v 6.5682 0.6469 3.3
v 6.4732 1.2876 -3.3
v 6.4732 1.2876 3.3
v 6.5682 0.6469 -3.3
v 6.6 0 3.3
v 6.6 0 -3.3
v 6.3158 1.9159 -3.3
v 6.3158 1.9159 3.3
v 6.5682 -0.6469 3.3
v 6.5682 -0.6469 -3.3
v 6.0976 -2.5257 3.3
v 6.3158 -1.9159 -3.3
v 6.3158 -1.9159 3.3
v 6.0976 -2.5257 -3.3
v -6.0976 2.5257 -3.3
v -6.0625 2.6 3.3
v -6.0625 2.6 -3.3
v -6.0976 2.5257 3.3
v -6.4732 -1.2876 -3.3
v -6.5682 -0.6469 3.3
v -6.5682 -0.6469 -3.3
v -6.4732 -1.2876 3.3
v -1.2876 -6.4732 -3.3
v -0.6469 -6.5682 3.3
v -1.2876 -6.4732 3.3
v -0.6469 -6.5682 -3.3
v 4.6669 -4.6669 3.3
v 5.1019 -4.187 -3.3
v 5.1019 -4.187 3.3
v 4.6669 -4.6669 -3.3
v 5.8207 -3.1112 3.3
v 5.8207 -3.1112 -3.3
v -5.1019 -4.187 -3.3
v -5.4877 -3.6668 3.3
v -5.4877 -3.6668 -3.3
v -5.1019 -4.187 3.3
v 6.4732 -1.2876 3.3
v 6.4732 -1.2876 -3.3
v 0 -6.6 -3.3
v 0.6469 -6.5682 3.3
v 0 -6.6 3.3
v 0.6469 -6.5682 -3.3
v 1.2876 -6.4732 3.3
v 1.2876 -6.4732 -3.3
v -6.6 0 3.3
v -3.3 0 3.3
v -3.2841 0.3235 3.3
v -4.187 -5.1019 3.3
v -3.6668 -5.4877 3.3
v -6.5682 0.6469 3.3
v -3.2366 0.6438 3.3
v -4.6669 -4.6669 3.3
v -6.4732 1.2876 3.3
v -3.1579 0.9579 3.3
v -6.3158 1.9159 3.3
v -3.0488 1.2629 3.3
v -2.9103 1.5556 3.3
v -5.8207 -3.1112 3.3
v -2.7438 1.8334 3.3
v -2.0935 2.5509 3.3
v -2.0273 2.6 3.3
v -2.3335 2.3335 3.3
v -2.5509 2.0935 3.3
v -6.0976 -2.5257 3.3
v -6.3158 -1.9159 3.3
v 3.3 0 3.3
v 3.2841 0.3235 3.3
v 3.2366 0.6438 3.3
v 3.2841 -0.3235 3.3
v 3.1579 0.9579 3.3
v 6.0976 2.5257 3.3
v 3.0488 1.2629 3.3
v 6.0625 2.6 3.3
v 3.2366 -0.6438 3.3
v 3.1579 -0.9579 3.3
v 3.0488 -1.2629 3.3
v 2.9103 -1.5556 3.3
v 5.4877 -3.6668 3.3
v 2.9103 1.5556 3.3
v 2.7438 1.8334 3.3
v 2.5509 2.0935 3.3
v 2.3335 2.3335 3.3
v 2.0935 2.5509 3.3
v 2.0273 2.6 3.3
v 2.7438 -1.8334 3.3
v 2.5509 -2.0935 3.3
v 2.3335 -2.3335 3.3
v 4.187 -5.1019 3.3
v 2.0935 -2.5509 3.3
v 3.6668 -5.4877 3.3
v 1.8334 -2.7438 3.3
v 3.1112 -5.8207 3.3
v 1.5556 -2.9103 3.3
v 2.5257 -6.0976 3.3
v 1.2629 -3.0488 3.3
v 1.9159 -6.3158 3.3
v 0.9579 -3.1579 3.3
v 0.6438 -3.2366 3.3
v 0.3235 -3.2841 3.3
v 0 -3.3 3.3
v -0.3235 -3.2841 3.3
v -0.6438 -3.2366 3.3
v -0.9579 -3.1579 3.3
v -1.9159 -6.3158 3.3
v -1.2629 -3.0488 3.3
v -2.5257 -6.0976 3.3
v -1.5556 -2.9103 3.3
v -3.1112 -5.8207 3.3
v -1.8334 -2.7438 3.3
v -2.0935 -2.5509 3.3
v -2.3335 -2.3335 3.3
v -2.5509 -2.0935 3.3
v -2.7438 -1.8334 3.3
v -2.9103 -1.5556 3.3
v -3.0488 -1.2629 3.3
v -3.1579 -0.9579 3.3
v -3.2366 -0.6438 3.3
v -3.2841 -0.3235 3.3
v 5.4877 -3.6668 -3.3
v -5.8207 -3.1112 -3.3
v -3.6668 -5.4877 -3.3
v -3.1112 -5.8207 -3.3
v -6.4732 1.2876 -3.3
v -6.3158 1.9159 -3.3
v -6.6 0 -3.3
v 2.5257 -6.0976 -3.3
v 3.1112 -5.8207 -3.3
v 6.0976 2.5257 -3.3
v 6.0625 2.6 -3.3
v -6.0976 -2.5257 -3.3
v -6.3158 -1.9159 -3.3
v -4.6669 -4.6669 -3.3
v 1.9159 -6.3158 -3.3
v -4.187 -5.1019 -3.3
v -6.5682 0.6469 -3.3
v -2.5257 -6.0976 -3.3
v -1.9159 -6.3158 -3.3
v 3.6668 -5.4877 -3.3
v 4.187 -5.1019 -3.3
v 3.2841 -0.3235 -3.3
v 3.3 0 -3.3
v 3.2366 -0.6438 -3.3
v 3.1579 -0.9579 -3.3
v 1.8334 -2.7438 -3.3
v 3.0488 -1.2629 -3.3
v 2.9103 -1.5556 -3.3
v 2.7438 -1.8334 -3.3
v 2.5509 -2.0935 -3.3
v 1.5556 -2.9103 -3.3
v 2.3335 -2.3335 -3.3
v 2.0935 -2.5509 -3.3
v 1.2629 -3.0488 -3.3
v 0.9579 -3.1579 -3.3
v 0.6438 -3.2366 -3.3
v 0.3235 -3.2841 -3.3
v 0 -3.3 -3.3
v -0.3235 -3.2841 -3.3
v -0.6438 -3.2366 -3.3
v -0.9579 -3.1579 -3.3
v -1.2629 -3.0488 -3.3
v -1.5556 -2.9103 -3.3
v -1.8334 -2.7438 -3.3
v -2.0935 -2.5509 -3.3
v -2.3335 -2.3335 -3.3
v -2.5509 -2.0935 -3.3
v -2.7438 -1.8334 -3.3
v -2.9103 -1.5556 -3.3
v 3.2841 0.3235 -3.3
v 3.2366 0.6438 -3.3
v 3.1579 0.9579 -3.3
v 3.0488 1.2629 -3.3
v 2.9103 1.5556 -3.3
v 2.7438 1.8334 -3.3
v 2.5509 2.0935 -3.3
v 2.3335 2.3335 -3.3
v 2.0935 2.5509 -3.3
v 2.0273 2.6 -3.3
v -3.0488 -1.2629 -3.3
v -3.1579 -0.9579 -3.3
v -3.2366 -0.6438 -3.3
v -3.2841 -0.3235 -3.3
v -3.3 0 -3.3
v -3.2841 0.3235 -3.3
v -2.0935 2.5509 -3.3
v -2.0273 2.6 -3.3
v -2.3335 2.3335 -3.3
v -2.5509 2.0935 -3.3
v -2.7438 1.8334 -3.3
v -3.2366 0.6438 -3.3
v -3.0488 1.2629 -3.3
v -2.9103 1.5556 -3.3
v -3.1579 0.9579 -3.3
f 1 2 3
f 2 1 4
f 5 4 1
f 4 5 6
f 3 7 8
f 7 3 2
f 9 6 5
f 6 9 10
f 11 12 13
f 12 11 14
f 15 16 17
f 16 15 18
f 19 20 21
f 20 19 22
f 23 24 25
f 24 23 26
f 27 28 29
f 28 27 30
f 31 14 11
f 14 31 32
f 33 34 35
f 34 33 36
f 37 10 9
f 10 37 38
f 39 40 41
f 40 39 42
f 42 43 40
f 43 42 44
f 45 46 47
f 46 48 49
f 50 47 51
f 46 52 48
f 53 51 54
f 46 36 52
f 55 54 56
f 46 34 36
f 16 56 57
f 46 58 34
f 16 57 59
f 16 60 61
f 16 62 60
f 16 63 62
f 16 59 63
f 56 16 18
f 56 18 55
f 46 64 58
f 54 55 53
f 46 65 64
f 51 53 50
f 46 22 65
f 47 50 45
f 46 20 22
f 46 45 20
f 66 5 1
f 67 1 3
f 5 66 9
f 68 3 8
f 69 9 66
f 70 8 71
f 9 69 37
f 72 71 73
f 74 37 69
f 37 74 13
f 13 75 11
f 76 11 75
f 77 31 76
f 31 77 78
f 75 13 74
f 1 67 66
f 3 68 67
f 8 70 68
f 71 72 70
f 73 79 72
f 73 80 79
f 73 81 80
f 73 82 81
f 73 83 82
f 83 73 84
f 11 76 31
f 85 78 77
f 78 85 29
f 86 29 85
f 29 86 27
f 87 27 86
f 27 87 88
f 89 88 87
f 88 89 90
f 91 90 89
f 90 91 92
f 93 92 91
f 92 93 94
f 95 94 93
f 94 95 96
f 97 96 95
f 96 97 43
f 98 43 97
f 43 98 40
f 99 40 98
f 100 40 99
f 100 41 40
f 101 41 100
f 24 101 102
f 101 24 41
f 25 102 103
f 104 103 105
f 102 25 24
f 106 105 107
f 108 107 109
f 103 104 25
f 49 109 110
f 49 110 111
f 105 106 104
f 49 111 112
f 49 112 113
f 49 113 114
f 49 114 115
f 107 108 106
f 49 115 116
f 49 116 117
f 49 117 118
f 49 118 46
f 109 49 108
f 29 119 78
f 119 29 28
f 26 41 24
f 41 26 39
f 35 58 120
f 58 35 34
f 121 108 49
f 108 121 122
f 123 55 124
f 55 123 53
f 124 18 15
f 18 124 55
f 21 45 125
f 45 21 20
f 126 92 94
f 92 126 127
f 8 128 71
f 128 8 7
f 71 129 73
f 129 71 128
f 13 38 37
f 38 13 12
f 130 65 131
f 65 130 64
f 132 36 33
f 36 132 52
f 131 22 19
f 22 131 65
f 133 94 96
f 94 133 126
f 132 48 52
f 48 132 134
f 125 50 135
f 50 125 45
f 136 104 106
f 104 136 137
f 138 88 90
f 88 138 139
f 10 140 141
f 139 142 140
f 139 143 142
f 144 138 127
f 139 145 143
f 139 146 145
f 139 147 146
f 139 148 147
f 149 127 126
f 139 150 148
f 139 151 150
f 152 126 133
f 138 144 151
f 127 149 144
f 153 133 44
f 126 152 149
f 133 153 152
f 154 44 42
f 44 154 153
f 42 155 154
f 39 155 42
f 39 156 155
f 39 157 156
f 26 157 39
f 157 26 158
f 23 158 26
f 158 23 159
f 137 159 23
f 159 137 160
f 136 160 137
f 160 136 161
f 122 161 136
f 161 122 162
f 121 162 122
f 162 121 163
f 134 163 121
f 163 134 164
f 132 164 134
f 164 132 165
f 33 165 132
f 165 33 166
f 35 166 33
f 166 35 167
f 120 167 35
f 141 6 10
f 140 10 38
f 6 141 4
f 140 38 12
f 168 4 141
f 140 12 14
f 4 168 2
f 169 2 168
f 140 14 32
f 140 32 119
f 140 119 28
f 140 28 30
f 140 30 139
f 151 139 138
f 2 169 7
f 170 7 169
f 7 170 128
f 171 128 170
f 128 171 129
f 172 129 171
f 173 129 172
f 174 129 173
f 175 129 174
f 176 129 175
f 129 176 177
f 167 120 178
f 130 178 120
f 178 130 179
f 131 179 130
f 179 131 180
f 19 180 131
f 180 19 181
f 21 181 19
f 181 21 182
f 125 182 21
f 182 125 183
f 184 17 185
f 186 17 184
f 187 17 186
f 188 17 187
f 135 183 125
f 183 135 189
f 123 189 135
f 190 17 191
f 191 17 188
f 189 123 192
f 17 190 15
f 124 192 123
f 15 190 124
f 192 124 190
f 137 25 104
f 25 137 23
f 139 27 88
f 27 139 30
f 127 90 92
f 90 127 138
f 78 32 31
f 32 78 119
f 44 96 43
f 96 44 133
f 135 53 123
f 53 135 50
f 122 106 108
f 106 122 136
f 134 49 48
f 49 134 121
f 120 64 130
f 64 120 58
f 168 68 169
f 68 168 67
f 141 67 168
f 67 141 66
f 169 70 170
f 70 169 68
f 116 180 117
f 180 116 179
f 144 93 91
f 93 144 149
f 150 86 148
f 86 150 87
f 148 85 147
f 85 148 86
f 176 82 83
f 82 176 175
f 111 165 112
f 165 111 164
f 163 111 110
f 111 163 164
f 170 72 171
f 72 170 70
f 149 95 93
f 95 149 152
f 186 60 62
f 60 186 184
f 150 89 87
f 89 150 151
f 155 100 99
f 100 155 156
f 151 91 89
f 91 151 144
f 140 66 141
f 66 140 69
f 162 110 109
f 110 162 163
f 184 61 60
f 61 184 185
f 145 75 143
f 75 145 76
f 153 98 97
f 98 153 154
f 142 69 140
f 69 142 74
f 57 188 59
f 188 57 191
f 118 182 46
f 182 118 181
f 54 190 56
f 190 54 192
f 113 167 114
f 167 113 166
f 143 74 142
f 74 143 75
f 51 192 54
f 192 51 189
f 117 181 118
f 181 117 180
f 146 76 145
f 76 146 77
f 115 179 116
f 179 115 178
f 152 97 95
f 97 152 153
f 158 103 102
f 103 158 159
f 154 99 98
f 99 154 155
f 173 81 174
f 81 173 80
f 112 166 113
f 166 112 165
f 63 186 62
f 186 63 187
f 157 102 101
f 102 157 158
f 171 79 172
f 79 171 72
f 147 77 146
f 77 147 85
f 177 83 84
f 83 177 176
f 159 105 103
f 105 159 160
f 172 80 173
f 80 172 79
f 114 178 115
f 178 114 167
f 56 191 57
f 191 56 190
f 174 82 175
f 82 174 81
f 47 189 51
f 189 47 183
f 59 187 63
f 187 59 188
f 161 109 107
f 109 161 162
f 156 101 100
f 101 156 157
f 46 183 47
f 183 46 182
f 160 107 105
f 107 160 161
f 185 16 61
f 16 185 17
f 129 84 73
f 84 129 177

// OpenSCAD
// COBRA Vertebra - T1 V7
// Height: 6.6000000000000005mm, OD: 13.200000000000001mm

$fn = 64;

difference() {
    // Outer cylinder
    cylinder(h=6.6000000000000005, d=13.200000000000001, center=true);
    
    // Inner channel
    cylinder(h=8.600000000000001, d=6.6000000000000005, center=true);

    // Solar panel cavity
    translate([0, 4.6000000000000005, 0])
    cube([50, 4, 30], center=true);

    // Pivot holes
    translate([0, 6.6000000000000005, 0.30000000000000027])
    rotate([90, 0, 0])
    cylinder(h=5.300000000000001, d=4, center=true);
    
    translate([0, 6.6000000000000005, -0.30000000000000027])
    rotate([90, 0, 0])
    cylinder(h=5.300000000000001, d=4, center=true);
}
